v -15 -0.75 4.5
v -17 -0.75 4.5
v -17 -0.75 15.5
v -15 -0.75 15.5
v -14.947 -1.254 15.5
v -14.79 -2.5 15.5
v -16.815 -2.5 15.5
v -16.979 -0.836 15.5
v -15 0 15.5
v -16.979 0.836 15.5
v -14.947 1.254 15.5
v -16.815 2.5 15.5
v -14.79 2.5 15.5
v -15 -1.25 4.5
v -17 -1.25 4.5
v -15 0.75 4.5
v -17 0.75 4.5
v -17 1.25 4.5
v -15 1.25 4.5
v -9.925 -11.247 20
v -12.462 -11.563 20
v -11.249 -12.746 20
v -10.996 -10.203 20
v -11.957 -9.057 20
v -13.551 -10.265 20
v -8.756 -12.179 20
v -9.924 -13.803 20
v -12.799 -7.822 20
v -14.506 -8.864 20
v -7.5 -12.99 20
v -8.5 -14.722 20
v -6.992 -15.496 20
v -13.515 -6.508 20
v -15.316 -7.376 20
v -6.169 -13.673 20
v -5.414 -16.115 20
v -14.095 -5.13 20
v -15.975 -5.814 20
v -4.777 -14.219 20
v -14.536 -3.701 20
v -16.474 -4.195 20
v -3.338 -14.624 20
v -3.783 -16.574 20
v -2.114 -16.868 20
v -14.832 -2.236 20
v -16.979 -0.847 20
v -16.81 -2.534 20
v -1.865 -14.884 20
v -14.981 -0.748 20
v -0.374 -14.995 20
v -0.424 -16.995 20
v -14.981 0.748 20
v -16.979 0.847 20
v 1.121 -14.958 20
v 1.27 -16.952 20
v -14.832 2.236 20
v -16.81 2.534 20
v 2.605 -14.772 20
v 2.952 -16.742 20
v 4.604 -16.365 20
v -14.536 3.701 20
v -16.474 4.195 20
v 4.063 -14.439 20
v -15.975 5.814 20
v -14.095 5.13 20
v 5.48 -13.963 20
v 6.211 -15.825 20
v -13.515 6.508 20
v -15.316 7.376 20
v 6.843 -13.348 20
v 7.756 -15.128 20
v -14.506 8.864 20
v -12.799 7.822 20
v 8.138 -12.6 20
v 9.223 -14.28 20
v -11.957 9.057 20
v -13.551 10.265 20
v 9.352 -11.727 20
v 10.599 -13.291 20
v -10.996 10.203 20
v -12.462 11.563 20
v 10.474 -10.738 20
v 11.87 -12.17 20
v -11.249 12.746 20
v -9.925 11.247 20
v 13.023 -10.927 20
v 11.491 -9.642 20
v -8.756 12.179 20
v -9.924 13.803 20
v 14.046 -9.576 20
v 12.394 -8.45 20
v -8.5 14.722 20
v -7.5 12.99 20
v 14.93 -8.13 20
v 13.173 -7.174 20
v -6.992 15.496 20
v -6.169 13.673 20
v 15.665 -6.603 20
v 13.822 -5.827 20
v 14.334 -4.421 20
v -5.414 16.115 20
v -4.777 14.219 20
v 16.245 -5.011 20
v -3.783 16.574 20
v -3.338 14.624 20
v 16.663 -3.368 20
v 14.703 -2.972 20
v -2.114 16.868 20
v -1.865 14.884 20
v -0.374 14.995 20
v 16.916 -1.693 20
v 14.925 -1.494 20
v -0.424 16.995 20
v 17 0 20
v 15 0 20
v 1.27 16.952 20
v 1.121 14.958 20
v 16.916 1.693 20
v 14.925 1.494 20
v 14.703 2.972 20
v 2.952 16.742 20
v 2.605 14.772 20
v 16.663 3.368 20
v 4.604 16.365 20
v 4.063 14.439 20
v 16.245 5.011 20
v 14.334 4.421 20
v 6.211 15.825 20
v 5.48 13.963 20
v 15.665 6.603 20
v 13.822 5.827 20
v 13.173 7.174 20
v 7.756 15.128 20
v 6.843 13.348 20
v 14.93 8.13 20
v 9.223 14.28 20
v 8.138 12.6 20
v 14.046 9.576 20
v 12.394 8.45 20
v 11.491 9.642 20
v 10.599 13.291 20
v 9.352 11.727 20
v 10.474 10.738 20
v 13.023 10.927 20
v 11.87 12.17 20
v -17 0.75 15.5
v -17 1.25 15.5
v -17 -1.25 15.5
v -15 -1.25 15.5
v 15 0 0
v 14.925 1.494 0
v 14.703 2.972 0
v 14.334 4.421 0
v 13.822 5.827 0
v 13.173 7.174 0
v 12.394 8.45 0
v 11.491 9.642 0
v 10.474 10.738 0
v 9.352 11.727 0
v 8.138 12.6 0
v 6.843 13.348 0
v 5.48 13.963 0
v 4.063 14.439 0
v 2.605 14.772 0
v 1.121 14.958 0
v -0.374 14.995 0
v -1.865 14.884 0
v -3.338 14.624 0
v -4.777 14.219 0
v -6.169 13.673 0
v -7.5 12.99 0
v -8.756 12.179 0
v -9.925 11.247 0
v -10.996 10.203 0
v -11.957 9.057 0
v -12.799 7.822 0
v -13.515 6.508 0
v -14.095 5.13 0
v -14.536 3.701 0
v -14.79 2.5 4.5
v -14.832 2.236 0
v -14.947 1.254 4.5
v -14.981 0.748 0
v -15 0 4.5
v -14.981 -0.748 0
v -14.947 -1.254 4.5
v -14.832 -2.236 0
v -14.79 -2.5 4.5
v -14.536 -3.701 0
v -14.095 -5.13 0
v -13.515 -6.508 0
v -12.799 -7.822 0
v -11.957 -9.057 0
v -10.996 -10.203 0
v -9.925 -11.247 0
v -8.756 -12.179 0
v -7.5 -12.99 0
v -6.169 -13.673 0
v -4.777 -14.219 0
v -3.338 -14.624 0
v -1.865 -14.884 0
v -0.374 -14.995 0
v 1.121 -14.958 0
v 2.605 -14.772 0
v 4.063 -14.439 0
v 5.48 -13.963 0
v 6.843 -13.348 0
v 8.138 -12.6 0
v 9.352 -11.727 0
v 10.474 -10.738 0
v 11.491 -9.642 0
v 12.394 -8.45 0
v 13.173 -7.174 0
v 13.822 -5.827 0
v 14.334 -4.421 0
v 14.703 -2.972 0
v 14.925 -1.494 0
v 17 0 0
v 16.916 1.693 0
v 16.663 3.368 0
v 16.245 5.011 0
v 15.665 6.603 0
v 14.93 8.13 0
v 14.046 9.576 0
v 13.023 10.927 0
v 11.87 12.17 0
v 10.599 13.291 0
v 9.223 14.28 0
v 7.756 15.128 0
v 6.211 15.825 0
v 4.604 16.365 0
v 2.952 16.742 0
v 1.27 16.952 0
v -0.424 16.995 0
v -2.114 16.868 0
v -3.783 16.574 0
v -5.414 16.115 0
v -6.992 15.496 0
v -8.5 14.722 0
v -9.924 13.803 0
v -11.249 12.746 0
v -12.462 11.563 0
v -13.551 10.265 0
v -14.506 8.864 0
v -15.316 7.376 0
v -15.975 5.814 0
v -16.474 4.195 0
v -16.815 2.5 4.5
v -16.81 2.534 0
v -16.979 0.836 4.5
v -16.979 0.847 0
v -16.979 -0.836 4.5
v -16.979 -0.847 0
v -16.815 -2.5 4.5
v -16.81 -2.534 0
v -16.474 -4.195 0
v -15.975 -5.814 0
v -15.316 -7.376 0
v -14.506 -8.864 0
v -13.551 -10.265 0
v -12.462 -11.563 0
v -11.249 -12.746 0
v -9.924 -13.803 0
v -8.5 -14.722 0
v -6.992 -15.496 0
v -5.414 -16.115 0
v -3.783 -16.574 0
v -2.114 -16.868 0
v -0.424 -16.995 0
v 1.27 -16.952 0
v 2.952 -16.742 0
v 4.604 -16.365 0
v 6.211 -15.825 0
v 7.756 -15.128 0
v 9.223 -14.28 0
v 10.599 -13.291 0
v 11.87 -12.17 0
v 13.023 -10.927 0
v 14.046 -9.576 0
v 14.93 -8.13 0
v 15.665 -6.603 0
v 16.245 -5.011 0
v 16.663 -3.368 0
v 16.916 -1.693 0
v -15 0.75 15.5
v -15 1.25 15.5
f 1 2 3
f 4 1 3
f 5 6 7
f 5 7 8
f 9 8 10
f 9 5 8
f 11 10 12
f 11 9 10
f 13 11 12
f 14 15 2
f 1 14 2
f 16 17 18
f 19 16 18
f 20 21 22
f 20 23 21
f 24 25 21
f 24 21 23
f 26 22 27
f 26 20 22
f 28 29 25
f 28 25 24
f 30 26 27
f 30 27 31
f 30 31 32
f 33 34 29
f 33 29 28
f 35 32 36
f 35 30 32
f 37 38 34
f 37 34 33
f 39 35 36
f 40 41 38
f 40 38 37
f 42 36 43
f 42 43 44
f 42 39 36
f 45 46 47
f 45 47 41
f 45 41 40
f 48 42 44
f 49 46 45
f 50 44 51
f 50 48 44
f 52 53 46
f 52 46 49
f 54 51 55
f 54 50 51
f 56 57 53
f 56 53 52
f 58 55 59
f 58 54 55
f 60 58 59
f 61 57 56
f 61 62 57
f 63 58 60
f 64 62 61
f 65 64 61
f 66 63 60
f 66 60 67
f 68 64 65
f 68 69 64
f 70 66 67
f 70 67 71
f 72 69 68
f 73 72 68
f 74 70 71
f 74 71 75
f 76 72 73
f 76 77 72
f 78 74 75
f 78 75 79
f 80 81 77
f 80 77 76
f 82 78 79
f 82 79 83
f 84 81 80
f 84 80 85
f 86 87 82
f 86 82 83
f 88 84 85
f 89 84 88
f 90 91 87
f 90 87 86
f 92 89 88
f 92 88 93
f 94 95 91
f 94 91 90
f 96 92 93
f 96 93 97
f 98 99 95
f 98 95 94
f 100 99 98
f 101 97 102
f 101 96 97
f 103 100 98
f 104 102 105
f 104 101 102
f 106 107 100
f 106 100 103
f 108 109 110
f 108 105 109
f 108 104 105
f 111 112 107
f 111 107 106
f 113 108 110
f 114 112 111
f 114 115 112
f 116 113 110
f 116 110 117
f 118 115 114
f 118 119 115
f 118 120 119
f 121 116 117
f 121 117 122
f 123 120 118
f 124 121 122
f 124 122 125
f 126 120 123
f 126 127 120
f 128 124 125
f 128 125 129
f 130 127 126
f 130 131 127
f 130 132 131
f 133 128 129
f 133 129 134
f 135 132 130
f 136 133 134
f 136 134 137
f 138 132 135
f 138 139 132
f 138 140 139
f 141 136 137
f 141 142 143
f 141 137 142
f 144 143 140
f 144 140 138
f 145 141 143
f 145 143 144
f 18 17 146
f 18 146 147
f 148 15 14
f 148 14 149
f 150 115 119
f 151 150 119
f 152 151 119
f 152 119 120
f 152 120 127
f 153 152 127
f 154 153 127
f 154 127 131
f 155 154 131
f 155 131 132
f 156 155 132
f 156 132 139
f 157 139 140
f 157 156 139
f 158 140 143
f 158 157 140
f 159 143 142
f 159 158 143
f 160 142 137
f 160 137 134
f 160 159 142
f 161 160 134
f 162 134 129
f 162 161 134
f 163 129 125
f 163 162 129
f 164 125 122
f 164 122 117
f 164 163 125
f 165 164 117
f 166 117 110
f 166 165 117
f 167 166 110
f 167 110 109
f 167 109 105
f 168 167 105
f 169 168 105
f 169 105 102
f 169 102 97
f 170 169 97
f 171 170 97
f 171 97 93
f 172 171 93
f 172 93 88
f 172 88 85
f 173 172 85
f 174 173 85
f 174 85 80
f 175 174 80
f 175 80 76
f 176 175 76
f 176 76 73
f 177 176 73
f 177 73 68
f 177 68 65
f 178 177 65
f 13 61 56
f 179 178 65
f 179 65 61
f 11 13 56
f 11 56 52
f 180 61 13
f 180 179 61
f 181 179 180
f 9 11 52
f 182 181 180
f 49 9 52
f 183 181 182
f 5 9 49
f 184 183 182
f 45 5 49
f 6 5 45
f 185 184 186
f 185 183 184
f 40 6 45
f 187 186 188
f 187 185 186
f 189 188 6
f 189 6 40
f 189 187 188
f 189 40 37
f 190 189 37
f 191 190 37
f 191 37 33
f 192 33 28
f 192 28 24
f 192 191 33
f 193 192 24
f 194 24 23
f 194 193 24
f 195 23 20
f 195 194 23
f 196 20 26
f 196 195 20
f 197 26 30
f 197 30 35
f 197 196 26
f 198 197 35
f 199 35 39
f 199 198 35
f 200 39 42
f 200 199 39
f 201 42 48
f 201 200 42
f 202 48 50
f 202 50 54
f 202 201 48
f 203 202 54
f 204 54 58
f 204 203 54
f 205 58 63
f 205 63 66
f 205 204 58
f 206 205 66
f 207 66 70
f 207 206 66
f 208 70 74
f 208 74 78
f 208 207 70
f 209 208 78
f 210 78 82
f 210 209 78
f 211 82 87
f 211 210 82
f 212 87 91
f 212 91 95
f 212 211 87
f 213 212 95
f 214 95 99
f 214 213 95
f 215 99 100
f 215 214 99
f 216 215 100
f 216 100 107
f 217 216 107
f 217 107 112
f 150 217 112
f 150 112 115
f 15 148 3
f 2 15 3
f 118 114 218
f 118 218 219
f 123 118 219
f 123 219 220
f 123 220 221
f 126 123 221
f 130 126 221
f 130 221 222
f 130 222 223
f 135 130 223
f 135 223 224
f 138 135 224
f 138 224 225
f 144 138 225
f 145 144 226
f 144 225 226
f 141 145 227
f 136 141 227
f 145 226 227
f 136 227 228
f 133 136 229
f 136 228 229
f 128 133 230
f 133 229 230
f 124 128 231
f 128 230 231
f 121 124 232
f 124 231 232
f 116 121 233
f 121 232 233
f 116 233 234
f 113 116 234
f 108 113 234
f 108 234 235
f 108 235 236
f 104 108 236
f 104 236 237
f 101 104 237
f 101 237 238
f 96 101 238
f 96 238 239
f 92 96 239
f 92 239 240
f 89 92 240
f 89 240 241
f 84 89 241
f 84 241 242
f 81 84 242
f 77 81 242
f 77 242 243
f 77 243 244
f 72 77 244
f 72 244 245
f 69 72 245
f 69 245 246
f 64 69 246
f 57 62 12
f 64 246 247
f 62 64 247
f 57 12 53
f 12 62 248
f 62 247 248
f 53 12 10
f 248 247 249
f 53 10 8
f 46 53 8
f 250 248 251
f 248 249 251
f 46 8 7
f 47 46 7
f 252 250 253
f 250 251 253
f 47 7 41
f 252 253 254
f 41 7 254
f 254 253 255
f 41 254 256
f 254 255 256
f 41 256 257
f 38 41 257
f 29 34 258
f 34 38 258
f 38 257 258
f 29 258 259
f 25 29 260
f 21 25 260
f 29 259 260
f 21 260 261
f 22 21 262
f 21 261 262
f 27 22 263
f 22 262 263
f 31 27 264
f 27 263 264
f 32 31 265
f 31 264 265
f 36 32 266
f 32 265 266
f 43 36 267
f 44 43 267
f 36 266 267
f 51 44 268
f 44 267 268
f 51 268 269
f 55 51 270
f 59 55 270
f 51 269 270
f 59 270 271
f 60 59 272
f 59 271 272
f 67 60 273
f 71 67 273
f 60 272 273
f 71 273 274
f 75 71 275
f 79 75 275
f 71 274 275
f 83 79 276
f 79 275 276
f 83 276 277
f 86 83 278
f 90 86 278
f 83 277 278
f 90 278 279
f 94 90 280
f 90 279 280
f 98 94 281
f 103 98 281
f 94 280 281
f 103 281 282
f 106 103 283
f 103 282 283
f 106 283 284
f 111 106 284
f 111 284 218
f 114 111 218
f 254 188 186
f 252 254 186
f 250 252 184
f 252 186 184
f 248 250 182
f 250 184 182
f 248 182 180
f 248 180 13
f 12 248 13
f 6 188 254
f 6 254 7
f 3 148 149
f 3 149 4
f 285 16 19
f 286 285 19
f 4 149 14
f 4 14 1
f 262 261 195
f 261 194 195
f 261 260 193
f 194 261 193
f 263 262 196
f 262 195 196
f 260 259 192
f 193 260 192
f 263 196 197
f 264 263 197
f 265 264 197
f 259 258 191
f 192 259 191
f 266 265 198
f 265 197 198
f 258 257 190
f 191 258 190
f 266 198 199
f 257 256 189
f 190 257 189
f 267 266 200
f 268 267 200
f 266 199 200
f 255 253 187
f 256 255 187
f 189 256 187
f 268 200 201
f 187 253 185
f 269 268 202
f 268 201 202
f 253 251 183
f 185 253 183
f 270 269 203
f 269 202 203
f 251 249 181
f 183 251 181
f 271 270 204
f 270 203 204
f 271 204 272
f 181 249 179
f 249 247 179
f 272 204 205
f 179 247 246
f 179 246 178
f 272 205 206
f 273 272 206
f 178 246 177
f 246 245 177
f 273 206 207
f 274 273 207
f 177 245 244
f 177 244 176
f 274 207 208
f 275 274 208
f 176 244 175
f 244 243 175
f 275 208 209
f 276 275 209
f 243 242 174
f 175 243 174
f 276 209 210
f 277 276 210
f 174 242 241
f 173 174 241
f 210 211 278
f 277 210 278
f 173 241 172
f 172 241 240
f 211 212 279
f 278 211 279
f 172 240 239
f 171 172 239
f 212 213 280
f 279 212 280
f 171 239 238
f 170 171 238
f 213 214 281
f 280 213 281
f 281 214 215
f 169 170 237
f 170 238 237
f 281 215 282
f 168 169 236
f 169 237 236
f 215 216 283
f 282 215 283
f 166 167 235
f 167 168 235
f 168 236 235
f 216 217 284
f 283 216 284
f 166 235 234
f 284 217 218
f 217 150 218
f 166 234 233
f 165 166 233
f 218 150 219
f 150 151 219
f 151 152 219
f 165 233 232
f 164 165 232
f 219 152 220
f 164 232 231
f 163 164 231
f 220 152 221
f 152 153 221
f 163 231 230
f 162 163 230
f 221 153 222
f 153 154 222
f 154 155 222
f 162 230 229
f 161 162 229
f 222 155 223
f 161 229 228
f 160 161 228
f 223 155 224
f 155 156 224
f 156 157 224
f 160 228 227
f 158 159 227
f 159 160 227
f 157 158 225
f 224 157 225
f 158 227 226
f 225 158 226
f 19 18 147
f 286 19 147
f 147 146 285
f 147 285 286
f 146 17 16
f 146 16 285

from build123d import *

# Parameters (mm, degrees)
F0_R     = 17
F0_R_2   = 15
F1_DEPTH = 20
F3_W     = 5
F3_H     = 11
F4_DEPTH = 25
F5_W     = 0.5
F5_H     = 11
F6_DEPTH = 2


with BuildPart() as f1:
    # F0 (on Top) → F1 (new body)
    with BuildSketch(Plane.XY):
        Circle(F0_R)
        Circle(F0_R_2, mode=Mode.SUBTRACT)
    extrude(amount=F1_DEPTH)

    # F3 (on Right) → F4 (cut)
    with BuildSketch(Plane.YZ):
        with Locations((0, 10)):
            Rectangle(F3_W, F3_H)
    extrude(amount=-F4_DEPTH, mode=Mode.SUBTRACT)


with BuildPart() as f6:
    # F5 (on offset) → F6 (new body)
    with BuildSketch(Plane.YZ.offset(-17)):
        with Locations((-1, 10)):
            Rectangle(F5_W, F5_H)
        with Locations((1, 10)):
            Rectangle(F5_W, F5_H)
    extrude(amount=F6_DEPTH)


solid = Compound([f1.part, f6.part])
